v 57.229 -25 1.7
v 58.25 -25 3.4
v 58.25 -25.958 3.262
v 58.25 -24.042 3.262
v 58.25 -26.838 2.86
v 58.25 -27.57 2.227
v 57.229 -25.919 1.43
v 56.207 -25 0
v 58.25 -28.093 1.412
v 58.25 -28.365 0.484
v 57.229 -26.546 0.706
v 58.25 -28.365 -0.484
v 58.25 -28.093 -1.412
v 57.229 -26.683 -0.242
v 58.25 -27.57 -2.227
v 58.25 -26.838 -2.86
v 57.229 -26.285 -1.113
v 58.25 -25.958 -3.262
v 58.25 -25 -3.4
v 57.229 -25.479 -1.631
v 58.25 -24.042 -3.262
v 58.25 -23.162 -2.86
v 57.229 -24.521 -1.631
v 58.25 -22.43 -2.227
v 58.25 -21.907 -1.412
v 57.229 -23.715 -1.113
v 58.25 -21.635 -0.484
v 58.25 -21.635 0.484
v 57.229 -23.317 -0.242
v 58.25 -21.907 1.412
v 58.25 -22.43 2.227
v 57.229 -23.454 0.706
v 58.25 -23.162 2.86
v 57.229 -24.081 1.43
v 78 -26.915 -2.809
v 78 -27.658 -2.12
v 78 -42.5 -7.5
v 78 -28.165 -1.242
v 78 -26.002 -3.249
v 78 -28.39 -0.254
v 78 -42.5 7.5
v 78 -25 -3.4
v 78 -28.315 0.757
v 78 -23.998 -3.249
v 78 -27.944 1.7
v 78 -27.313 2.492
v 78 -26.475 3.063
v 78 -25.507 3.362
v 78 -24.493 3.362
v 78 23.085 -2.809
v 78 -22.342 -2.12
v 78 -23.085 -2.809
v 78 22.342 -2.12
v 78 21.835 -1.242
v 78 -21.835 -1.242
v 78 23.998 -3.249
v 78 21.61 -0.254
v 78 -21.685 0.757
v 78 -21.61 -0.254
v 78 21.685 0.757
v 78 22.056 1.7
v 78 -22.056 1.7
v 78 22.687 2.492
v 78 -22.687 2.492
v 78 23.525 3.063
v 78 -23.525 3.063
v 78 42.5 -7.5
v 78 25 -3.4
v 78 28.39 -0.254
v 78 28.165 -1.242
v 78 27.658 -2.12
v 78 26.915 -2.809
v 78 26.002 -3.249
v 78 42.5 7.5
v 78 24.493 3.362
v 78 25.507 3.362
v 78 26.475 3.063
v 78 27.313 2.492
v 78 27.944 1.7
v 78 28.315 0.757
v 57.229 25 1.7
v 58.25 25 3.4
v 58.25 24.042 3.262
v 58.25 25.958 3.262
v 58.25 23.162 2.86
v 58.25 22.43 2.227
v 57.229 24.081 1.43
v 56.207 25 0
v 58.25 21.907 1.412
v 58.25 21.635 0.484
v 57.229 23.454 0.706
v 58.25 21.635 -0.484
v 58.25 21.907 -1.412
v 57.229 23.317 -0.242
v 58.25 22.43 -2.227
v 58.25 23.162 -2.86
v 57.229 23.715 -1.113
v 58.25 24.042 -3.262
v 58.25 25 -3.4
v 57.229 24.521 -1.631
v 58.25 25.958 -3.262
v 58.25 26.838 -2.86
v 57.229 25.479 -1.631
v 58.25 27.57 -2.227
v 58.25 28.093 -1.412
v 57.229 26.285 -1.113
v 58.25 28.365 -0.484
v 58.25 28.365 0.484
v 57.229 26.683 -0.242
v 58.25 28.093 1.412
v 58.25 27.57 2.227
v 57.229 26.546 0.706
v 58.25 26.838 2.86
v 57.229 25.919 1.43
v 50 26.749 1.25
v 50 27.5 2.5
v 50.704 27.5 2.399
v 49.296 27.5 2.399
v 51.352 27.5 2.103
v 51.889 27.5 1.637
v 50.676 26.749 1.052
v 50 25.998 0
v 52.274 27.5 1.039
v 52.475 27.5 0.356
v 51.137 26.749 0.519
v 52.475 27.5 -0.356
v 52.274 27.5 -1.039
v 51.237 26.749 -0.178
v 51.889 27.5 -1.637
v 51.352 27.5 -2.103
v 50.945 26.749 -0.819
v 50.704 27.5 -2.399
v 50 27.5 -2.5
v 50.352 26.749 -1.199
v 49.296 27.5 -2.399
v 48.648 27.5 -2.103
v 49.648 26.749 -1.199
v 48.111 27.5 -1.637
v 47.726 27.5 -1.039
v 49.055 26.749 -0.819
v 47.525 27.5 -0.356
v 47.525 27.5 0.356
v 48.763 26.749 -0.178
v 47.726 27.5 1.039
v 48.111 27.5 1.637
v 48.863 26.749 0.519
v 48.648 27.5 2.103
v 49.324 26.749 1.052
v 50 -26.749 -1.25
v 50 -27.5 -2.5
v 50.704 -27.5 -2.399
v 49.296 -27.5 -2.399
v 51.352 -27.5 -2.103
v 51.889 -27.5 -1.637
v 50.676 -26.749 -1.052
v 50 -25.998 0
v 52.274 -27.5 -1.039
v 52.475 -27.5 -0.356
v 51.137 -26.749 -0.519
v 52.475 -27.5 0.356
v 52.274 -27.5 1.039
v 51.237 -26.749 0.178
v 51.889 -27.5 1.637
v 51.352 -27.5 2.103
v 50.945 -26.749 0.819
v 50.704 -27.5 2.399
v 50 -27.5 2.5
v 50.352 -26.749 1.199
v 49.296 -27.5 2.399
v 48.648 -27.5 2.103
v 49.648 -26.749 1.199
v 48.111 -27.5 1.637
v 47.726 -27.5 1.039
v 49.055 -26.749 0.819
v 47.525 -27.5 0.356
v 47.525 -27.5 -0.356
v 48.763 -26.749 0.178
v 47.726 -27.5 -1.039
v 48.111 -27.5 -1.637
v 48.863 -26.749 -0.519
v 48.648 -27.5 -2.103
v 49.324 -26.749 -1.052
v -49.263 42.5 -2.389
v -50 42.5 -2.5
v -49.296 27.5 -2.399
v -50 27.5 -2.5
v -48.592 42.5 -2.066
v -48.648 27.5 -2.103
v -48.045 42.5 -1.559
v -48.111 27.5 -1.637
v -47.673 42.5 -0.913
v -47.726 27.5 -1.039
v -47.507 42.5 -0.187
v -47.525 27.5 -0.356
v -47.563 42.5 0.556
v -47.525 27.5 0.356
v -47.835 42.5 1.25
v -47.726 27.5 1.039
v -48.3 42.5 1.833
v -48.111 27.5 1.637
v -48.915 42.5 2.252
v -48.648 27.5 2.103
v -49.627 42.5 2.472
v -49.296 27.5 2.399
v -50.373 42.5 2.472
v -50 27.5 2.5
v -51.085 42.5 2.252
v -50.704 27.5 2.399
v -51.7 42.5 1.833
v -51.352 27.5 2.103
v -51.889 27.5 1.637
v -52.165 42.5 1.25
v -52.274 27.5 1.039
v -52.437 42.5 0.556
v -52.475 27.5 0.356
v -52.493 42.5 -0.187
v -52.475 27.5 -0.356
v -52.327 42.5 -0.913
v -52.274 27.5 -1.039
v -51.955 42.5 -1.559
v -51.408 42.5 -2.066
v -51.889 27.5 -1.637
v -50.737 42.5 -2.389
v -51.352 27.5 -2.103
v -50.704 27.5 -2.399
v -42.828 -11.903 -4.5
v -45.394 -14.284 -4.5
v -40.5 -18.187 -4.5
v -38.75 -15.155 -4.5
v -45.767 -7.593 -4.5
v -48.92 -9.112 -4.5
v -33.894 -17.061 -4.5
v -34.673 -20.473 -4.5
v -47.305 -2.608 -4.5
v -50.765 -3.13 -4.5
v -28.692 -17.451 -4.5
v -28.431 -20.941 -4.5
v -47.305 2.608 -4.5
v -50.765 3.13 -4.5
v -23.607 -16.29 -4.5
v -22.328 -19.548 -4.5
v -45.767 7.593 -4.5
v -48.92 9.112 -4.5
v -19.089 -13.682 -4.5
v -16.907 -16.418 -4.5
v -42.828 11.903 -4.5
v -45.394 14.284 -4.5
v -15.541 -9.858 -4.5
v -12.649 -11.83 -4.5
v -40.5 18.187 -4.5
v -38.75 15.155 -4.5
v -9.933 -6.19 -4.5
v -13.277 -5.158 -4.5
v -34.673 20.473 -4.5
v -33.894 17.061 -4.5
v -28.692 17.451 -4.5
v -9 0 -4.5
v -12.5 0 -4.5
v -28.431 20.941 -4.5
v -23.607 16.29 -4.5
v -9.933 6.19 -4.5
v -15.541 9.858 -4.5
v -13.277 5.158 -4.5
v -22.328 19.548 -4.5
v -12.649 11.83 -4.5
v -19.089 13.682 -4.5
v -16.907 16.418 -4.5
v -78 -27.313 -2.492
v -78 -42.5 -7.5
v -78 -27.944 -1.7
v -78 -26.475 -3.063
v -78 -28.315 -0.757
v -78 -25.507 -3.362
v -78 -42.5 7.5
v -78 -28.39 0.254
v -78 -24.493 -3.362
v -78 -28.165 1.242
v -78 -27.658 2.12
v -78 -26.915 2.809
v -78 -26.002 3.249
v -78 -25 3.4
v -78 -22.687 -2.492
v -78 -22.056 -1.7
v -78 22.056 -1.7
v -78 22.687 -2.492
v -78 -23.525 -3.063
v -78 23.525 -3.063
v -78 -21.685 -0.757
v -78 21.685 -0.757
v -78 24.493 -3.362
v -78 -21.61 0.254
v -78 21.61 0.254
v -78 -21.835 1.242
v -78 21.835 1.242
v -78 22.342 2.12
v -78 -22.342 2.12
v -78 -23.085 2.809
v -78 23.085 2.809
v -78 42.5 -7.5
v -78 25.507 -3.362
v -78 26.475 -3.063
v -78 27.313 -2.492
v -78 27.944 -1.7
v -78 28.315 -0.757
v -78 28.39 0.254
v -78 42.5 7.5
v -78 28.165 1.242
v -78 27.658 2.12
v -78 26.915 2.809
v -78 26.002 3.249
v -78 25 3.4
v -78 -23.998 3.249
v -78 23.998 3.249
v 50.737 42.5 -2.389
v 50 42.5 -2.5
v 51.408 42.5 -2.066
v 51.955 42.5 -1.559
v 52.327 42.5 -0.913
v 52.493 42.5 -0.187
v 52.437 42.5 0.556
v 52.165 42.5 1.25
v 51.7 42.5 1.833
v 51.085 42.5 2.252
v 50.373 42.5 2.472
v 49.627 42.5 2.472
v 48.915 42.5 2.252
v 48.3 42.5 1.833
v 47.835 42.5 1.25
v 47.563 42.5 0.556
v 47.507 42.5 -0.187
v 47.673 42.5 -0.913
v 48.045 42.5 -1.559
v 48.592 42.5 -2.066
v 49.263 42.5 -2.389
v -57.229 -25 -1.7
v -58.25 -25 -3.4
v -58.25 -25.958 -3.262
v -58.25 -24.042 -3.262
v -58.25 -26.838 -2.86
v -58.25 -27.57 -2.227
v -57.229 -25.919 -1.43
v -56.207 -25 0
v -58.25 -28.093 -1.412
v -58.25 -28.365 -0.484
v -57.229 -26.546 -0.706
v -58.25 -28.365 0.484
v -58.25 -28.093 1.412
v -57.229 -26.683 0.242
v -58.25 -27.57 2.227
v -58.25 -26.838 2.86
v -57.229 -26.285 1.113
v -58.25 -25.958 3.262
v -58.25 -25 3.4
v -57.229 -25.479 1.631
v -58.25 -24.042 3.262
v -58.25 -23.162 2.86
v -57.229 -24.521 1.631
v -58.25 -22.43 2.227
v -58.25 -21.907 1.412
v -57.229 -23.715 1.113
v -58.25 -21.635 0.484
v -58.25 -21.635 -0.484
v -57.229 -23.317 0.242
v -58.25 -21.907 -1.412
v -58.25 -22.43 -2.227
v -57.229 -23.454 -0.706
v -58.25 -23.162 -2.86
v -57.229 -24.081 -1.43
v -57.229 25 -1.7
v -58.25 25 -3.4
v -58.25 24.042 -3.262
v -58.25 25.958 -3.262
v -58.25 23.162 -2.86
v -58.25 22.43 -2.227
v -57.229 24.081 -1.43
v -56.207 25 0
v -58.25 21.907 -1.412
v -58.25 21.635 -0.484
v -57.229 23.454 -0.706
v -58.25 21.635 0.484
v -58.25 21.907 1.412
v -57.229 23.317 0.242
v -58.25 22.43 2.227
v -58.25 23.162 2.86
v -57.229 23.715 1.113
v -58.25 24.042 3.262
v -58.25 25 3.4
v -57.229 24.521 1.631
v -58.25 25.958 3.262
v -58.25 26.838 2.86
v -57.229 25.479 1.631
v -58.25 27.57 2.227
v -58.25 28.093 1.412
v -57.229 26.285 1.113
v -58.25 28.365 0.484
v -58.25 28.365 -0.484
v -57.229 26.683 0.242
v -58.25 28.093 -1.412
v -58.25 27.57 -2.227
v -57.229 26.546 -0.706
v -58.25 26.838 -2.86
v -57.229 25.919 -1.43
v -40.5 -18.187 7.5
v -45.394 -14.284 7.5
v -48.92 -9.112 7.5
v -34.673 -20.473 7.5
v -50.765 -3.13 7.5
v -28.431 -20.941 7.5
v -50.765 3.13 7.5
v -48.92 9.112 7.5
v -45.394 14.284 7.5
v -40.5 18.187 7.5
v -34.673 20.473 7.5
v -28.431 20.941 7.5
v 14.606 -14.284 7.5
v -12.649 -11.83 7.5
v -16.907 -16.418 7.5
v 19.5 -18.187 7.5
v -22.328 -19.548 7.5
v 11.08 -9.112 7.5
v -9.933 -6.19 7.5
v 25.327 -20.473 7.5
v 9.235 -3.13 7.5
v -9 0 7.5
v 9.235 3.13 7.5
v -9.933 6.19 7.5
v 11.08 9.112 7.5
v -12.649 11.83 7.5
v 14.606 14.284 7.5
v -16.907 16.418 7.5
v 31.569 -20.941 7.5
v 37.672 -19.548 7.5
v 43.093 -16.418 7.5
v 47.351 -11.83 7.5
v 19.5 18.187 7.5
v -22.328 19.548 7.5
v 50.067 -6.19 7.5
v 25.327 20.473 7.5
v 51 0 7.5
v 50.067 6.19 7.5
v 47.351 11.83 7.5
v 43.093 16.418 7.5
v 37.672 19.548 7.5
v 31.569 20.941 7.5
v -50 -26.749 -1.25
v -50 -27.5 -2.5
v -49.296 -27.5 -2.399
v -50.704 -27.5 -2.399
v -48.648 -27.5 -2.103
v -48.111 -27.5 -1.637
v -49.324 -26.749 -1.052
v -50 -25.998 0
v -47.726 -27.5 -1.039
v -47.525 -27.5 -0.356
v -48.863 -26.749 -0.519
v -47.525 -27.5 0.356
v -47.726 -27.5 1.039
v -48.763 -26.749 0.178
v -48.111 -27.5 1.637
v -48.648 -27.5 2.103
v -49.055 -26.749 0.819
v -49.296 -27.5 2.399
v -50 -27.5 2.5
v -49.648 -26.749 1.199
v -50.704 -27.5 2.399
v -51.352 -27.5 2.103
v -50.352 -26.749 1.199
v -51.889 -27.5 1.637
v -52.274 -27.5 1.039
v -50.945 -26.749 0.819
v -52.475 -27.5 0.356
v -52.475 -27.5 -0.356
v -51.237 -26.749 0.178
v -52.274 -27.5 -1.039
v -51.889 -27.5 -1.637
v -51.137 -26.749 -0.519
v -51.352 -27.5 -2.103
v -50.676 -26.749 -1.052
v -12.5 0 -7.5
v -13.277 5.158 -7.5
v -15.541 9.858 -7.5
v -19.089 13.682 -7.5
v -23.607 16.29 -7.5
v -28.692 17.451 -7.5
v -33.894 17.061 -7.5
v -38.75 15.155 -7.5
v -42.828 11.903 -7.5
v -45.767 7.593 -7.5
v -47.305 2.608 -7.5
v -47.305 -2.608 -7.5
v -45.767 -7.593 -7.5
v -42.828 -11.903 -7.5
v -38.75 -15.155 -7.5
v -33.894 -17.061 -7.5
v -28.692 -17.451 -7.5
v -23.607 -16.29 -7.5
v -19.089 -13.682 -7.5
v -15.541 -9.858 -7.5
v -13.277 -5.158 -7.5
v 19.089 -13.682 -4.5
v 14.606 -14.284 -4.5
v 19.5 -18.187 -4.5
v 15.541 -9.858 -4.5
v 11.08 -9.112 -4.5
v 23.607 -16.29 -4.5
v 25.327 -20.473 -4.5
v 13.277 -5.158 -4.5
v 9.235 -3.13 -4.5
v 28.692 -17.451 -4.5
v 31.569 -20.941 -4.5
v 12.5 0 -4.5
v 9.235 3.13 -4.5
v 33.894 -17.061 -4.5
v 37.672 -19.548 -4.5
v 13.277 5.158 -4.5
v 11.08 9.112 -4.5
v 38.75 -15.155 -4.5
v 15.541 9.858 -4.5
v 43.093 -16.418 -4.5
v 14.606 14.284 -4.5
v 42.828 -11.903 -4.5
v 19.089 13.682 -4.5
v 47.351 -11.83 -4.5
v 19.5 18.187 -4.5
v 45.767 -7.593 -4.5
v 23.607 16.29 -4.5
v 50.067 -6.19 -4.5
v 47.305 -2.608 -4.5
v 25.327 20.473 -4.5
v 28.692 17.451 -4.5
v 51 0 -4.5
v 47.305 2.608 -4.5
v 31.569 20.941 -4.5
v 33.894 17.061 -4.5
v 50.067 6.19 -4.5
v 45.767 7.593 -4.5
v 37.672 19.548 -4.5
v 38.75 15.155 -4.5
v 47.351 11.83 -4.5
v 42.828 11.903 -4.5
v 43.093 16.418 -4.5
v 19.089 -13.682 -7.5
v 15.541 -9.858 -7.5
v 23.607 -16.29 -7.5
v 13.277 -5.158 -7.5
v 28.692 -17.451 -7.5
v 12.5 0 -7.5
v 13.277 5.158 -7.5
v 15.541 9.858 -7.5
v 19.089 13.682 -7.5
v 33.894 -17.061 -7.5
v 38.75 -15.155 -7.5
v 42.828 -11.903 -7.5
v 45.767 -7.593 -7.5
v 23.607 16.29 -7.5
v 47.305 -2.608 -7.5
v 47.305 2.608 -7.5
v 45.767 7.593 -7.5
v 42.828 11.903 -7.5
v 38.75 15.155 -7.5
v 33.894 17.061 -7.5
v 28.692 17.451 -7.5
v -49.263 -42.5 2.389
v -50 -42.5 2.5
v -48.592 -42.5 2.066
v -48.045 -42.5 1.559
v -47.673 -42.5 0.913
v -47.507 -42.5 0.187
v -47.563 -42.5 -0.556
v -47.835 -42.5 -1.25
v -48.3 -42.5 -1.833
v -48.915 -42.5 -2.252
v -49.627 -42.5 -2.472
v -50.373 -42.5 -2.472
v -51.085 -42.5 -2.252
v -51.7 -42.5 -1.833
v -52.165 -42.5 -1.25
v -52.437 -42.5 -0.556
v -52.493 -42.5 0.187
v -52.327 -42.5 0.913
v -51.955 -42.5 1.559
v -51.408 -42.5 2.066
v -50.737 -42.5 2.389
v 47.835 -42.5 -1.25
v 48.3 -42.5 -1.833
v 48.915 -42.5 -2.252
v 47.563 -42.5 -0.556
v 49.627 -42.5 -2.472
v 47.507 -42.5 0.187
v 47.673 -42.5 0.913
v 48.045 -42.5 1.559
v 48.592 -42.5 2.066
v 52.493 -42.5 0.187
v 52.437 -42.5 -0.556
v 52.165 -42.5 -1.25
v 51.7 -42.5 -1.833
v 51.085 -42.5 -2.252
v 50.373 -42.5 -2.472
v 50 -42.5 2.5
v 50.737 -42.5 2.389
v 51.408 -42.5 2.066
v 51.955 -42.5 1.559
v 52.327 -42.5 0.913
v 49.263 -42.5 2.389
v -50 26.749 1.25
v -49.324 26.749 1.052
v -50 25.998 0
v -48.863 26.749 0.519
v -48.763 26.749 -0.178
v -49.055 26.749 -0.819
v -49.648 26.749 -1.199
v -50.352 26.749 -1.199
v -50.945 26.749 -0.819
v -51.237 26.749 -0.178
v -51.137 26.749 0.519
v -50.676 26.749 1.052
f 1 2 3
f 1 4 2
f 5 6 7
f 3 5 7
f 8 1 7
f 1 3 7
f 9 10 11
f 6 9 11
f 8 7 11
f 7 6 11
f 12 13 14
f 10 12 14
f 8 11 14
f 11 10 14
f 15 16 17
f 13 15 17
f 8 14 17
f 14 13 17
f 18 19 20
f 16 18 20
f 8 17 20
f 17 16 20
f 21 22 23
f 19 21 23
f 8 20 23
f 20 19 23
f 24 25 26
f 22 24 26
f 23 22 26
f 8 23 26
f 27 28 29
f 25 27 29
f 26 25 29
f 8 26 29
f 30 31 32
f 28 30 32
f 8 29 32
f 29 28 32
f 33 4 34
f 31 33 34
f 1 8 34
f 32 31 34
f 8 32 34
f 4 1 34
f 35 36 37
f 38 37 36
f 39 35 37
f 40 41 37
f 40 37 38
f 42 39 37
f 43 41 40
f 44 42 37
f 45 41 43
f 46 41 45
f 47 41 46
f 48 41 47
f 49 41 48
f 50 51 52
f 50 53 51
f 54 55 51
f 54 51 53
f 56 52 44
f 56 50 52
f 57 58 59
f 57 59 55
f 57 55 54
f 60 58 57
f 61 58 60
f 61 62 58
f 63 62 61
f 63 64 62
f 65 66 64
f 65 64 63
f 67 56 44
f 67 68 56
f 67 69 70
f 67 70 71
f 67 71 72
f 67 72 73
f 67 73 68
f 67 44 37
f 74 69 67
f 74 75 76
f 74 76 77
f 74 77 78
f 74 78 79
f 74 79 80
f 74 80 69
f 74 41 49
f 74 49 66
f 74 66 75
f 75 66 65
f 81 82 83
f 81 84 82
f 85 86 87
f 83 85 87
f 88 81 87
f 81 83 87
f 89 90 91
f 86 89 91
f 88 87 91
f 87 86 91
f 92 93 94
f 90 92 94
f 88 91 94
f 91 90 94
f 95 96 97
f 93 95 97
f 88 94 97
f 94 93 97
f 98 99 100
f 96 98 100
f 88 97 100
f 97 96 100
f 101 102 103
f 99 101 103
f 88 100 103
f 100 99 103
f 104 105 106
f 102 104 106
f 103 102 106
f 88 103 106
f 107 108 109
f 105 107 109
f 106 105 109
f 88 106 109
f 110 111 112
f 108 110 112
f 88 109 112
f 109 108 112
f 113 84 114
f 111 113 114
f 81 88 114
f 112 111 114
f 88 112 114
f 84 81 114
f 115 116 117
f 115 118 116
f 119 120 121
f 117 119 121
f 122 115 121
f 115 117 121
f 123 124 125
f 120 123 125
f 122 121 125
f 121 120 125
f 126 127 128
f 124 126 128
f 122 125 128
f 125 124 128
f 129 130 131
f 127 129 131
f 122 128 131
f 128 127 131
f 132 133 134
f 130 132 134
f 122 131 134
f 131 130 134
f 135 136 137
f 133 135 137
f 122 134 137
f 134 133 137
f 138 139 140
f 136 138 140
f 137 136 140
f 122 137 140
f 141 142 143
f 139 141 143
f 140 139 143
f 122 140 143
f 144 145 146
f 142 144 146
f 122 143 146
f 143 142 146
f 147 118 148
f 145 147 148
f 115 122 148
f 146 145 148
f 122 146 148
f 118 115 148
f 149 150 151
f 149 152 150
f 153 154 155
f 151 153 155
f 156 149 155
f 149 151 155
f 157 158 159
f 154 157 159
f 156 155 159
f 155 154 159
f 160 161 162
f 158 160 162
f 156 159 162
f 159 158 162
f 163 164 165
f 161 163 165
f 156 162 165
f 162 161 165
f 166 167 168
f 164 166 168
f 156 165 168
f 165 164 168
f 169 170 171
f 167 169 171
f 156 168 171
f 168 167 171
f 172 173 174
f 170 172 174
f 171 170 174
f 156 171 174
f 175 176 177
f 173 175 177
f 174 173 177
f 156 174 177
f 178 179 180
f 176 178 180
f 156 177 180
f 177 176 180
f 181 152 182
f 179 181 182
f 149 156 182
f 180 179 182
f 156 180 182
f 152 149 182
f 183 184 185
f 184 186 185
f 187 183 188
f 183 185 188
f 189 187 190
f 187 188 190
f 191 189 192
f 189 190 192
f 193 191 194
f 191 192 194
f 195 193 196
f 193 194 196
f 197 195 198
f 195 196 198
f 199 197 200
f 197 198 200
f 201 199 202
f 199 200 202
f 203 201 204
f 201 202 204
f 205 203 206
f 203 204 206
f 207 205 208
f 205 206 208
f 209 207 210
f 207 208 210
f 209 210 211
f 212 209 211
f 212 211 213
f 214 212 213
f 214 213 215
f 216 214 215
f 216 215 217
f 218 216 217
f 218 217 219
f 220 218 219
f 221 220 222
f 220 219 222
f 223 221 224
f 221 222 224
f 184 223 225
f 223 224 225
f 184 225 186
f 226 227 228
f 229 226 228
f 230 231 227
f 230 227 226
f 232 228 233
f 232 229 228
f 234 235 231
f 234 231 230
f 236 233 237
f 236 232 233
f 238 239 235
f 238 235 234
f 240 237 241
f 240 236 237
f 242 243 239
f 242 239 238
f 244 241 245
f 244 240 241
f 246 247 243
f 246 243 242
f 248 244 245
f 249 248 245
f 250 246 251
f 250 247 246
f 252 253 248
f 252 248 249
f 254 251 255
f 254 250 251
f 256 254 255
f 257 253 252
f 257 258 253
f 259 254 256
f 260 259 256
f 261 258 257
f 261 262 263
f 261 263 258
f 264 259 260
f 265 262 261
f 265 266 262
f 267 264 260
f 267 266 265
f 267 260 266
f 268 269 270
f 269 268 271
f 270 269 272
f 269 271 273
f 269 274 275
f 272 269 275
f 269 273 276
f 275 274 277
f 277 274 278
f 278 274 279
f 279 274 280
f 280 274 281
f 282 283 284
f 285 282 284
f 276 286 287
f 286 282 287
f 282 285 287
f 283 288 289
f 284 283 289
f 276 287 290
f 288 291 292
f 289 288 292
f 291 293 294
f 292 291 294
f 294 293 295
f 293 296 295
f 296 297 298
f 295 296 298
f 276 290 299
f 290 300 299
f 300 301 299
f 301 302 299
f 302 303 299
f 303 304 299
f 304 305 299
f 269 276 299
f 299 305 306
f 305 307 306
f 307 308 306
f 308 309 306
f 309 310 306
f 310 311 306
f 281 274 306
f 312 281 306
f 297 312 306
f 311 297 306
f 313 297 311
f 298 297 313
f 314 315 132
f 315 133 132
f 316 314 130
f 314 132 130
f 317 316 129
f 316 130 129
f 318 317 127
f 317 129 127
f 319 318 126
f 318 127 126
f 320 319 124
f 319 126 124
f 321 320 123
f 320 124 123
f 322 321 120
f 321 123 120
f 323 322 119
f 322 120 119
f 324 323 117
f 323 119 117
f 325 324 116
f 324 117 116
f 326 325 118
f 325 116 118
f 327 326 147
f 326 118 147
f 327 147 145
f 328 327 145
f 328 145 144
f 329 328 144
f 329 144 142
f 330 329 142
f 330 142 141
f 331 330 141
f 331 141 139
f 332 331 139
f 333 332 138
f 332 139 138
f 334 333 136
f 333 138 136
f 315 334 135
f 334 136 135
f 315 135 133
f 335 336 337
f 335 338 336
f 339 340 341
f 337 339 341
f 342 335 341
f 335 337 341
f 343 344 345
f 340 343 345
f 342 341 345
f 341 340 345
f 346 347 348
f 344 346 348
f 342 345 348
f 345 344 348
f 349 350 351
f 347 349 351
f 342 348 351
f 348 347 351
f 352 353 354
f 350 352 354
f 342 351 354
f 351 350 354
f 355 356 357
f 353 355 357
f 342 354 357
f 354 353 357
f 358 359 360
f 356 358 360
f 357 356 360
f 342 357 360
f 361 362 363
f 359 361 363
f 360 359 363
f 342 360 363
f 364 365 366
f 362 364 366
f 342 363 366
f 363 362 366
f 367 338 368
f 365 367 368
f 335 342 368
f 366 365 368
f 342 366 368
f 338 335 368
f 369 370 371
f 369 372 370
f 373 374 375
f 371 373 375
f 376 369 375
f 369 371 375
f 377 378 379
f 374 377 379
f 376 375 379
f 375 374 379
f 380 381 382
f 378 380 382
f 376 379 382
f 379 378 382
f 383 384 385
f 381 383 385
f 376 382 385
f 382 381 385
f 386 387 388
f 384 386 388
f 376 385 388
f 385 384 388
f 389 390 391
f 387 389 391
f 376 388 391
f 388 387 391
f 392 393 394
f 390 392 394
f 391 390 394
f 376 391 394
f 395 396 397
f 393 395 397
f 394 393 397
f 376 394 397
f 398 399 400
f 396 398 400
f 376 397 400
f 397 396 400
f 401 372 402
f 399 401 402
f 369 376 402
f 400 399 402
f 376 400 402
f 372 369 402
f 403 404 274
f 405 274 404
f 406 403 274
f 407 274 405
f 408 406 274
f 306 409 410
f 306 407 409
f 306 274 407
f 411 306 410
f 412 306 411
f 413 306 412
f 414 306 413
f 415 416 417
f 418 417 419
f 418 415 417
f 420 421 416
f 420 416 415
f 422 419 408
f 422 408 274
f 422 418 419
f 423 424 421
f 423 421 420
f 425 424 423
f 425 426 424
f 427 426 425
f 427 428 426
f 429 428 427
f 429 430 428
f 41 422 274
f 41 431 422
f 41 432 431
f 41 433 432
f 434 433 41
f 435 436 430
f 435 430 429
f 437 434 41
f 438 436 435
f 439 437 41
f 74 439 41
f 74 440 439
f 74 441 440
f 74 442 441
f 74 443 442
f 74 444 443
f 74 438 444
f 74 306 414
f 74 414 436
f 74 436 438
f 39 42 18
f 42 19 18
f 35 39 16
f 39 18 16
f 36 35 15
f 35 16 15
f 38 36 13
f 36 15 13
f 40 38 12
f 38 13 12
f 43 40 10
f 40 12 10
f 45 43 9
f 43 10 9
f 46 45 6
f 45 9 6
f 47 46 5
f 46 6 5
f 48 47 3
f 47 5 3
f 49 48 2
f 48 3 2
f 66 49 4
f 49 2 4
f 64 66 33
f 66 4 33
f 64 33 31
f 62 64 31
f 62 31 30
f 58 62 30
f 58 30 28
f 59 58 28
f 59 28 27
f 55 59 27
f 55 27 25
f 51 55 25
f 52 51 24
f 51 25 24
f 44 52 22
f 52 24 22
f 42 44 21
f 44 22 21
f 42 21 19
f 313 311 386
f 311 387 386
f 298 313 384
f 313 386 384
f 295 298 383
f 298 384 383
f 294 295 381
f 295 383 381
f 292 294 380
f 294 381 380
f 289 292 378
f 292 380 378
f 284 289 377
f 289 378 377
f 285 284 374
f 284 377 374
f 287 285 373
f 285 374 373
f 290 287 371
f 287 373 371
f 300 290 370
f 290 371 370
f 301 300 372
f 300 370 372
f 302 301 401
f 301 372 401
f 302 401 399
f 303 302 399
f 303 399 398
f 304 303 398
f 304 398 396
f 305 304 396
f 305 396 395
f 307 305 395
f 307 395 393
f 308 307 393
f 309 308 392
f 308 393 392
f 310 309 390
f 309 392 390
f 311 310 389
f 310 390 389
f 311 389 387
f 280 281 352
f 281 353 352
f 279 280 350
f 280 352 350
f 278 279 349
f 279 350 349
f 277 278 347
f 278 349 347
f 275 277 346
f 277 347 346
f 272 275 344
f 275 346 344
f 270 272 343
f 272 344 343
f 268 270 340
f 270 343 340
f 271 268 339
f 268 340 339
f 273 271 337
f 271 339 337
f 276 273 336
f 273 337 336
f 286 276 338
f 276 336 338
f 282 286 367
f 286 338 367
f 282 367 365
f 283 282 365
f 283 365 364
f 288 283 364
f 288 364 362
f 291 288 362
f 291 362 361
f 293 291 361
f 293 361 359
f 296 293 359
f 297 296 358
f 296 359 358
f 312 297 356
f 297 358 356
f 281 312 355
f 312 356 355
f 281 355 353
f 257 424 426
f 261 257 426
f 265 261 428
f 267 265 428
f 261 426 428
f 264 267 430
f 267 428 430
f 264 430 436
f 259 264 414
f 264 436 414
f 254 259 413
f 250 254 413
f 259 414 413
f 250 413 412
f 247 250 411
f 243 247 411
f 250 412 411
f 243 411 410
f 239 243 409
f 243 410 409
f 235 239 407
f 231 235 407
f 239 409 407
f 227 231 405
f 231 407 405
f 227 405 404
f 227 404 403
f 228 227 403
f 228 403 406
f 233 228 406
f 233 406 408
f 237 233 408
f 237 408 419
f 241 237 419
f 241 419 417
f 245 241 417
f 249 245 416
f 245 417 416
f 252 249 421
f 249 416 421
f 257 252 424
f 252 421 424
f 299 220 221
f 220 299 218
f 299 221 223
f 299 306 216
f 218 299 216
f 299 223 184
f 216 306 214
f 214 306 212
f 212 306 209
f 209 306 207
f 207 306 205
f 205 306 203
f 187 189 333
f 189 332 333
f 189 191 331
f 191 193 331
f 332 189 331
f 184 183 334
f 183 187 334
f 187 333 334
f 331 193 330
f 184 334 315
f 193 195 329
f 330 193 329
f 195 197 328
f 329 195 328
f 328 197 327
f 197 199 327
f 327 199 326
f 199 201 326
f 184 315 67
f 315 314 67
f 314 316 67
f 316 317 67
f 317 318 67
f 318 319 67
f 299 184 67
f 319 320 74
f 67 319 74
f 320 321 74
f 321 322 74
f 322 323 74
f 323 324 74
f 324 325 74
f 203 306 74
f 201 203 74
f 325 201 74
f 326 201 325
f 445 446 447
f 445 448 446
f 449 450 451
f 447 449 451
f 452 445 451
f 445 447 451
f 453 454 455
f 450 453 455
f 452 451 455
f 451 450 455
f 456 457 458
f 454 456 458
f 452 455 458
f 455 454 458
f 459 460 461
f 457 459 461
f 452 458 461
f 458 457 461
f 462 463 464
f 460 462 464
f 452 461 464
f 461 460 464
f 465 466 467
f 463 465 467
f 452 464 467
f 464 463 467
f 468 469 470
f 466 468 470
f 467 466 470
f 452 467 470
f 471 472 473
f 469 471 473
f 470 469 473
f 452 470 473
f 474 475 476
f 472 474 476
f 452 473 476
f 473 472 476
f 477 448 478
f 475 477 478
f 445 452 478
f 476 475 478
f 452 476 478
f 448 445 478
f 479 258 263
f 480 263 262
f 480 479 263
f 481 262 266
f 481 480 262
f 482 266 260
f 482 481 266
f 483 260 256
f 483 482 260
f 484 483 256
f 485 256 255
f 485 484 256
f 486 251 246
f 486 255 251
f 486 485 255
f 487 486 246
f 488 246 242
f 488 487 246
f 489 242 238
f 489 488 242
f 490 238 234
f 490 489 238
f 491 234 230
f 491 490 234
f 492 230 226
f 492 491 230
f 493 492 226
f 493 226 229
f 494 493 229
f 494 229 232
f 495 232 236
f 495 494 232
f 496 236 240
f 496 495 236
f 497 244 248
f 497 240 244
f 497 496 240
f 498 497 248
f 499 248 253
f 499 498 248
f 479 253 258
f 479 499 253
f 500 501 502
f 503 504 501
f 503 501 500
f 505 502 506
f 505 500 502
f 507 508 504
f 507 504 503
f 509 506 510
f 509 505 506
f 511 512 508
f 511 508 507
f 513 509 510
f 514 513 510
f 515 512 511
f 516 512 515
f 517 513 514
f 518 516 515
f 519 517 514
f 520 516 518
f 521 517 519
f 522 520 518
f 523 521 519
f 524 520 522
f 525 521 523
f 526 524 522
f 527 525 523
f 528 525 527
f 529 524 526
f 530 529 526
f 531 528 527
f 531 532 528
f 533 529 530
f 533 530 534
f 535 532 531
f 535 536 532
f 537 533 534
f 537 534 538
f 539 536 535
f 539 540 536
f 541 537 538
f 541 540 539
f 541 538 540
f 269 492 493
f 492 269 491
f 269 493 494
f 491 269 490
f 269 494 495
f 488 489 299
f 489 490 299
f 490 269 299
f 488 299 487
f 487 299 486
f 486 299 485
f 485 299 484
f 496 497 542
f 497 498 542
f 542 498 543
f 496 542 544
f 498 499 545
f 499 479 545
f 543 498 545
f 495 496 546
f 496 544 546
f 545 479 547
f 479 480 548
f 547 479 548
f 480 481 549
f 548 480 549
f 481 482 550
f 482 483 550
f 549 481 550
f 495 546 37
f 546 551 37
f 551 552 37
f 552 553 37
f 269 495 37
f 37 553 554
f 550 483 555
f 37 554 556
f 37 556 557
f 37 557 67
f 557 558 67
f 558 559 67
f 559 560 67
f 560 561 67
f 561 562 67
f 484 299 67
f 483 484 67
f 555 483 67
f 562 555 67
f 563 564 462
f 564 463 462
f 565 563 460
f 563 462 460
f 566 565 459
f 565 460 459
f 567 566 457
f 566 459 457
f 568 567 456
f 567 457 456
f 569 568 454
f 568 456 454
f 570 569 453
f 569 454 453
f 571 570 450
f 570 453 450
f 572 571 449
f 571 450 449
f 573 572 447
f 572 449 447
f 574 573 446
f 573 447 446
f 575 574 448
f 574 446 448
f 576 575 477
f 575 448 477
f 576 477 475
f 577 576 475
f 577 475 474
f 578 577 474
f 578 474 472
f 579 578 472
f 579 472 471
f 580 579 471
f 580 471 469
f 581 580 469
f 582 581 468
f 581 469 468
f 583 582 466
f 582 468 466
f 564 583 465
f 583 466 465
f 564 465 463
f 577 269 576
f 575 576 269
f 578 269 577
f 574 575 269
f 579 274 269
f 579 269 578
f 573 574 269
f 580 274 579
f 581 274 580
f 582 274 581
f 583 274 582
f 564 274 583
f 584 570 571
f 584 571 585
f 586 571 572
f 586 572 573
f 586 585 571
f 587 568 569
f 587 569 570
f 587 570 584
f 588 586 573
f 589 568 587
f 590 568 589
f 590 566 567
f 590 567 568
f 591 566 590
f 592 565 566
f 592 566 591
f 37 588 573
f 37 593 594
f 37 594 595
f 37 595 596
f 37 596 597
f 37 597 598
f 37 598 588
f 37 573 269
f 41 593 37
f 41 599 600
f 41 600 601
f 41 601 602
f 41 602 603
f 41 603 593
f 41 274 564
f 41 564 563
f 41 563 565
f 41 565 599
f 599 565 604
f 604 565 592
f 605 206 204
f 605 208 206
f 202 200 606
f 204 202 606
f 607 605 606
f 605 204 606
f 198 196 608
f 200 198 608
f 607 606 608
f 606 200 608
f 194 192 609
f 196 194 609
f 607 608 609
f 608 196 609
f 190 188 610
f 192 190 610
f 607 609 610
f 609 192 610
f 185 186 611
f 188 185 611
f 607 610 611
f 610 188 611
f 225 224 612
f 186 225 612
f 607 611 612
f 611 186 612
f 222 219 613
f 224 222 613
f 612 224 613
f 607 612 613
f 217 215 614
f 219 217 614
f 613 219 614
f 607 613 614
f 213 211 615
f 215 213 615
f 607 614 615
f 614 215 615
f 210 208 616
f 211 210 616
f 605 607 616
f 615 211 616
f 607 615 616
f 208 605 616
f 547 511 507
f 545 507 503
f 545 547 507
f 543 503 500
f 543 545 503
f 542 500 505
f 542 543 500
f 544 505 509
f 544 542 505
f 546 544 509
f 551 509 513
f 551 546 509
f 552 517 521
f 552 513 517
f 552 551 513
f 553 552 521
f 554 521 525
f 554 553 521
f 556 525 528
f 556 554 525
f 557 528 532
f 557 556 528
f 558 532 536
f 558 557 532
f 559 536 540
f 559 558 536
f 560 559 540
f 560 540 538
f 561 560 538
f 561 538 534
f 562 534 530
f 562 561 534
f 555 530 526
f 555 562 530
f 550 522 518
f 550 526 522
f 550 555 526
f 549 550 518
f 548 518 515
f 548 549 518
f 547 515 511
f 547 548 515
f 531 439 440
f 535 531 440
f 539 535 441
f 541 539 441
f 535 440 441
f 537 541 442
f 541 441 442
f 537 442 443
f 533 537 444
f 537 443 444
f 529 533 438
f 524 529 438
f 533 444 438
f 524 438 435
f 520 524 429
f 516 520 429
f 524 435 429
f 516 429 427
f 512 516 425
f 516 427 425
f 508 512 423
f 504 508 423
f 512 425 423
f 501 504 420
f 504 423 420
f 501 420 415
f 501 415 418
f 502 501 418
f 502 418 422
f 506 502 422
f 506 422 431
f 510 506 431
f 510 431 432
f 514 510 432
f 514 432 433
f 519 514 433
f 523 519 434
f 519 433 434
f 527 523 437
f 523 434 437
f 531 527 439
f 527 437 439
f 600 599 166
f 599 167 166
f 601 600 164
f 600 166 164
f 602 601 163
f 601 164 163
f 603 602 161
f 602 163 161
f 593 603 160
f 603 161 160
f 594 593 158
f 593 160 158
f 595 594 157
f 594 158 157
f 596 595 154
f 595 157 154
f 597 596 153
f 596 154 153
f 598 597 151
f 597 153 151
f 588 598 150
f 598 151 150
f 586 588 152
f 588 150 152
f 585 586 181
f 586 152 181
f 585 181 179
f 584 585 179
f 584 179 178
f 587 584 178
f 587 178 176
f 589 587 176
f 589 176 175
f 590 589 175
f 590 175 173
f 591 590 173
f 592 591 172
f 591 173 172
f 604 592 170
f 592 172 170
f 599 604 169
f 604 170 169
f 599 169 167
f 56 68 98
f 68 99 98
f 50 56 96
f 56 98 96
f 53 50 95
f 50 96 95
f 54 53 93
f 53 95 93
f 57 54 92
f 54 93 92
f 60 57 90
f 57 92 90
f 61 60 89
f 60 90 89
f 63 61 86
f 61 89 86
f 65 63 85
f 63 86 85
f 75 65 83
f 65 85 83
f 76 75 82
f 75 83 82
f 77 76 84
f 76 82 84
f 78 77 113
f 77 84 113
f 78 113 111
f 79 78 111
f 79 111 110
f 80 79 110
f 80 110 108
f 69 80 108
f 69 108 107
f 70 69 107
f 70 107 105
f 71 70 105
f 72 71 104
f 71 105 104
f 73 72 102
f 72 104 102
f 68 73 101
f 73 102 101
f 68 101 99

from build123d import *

# Parameters (mm, degrees)
SKETCH1_W                       = 156
SKETCH1_H                       = 85
SKETCH1_R                       = 17.5
BOSS_EXTRUDE1_DEPTH             = 7.5
SKETCH2_R                       = 21
CUT_EXTRUDE1_DEPTH              = 12
M8_TAPPED_HOLE1_D               = 6.8
M8_TAPPED_HOLE1_DEPTH           = 19.75
M8_TAPPED_HOLE1_TIP             = 2.042926105
M8_TAPPED_HOLE1_ON_FACE_2_D     = 6.8
M8_TAPPED_HOLE1_ON_FACE_2_DEPTH = 19.75
M8_TAPPED_HOLE1_ON_FACE_2_TIP   = 2.042926105
M6_TAPPED_HOLE1_D               = 5
M6_TAPPED_HOLE1_DEPTH           = 15
M6_TAPPED_HOLE1_TIP             = 1.502151548
M6_TAPPED_HOLE1_ON_FACE_2_D     = 5
M6_TAPPED_HOLE1_ON_FACE_2_DEPTH = 15
M6_TAPPED_HOLE1_ON_FACE_2_TIP   = 1.502151548


with BuildPart() as part:
    # Sketch1 → Boss-Extrude1 (new, symmetric)
    with BuildSketch(Plane.XY):
        Rectangle(SKETCH1_W, SKETCH1_H)
        with Locations((-30, 0)):
            Circle(SKETCH1_R, mode=Mode.SUBTRACT)
        with Locations(Location((30, 0, 0), (0, 0, 180))):
            Circle(SKETCH1_R, mode=Mode.SUBTRACT)
    extrude(amount=BOSS_EXTRUDE1_DEPTH, both=True)

    # Sketch2 → Cut-Extrude1 (cut)
    with BuildSketch(Plane.XY.offset(7.5)):
        with Locations((-30, 0)):
            Circle(SKETCH2_R)
        with Locations((30, 0)):
            Circle(SKETCH2_R)
    extrude(amount=-CUT_EXTRUDE1_DEPTH, mode=Mode.SUBTRACT)

    # M8 Tapped Hole1
    with Locations(Plane(origin=(-78, 25, 0), x_dir=(0, 0, -1), z_dir=(-1, 0, 0))):
        with Locations((0, 0), (0, 50)):
            Hole(M8_TAPPED_HOLE1_D / 2, depth=M8_TAPPED_HOLE1_DEPTH)
            with Locations((0, 0, -(M8_TAPPED_HOLE1_DEPTH + M8_TAPPED_HOLE1_TIP / 2))):  # 118° drill point
                Cone(0, M8_TAPPED_HOLE1_D / 2, M8_TAPPED_HOLE1_TIP, mode=Mode.SUBTRACT)

    # M8 Tapped Hole1 on face 2
    with Locations(Plane(origin=(78, 25, 0), x_dir=(0, 0, 1), z_dir=(1, 0, 0))):
        with Locations((0, 0), (0, 50)):
            Hole(M8_TAPPED_HOLE1_ON_FACE_2_D / 2, depth=M8_TAPPED_HOLE1_ON_FACE_2_DEPTH)
            with Locations((0, 0, -(M8_TAPPED_HOLE1_ON_FACE_2_DEPTH + M8_TAPPED_HOLE1_ON_FACE_2_TIP / 2))):  # 118° drill point
                Cone(0, M8_TAPPED_HOLE1_ON_FACE_2_D / 2, M8_TAPPED_HOLE1_ON_FACE_2_TIP, mode=Mode.SUBTRACT)

    # M6 Tapped Hole1
    with Locations(Plane(origin=(-50, -42.5, 0), x_dir=(0, 0, -1), z_dir=(0, -1, 0))):
        with Locations((0, 0), (0, 100)):
            Hole(M6_TAPPED_HOLE1_D / 2, depth=M6_TAPPED_HOLE1_DEPTH)
            with Locations((0, 0, -(M6_TAPPED_HOLE1_DEPTH + M6_TAPPED_HOLE1_TIP / 2))):  # 118° drill point
                Cone(0, M6_TAPPED_HOLE1_D / 2, M6_TAPPED_HOLE1_TIP, mode=Mode.SUBTRACT)

    # M6 Tapped Hole1 on face 2
    with Locations(Plane(origin=(-50, 42.5, 0), x_dir=(0, 0, 1), z_dir=(0, 1, 0))):
        with Locations((0, 0), (0, 100)):
            Hole(M6_TAPPED_HOLE1_ON_FACE_2_D / 2, depth=M6_TAPPED_HOLE1_ON_FACE_2_DEPTH)
            with Locations((0, 0, -(M6_TAPPED_HOLE1_ON_FACE_2_DEPTH + M6_TAPPED_HOLE1_ON_FACE_2_TIP / 2))):  # 118° drill point
                Cone(0, M6_TAPPED_HOLE1_ON_FACE_2_D / 2, M6_TAPPED_HOLE1_ON_FACE_2_TIP, mode=Mode.SUBTRACT)


solid = part.part
